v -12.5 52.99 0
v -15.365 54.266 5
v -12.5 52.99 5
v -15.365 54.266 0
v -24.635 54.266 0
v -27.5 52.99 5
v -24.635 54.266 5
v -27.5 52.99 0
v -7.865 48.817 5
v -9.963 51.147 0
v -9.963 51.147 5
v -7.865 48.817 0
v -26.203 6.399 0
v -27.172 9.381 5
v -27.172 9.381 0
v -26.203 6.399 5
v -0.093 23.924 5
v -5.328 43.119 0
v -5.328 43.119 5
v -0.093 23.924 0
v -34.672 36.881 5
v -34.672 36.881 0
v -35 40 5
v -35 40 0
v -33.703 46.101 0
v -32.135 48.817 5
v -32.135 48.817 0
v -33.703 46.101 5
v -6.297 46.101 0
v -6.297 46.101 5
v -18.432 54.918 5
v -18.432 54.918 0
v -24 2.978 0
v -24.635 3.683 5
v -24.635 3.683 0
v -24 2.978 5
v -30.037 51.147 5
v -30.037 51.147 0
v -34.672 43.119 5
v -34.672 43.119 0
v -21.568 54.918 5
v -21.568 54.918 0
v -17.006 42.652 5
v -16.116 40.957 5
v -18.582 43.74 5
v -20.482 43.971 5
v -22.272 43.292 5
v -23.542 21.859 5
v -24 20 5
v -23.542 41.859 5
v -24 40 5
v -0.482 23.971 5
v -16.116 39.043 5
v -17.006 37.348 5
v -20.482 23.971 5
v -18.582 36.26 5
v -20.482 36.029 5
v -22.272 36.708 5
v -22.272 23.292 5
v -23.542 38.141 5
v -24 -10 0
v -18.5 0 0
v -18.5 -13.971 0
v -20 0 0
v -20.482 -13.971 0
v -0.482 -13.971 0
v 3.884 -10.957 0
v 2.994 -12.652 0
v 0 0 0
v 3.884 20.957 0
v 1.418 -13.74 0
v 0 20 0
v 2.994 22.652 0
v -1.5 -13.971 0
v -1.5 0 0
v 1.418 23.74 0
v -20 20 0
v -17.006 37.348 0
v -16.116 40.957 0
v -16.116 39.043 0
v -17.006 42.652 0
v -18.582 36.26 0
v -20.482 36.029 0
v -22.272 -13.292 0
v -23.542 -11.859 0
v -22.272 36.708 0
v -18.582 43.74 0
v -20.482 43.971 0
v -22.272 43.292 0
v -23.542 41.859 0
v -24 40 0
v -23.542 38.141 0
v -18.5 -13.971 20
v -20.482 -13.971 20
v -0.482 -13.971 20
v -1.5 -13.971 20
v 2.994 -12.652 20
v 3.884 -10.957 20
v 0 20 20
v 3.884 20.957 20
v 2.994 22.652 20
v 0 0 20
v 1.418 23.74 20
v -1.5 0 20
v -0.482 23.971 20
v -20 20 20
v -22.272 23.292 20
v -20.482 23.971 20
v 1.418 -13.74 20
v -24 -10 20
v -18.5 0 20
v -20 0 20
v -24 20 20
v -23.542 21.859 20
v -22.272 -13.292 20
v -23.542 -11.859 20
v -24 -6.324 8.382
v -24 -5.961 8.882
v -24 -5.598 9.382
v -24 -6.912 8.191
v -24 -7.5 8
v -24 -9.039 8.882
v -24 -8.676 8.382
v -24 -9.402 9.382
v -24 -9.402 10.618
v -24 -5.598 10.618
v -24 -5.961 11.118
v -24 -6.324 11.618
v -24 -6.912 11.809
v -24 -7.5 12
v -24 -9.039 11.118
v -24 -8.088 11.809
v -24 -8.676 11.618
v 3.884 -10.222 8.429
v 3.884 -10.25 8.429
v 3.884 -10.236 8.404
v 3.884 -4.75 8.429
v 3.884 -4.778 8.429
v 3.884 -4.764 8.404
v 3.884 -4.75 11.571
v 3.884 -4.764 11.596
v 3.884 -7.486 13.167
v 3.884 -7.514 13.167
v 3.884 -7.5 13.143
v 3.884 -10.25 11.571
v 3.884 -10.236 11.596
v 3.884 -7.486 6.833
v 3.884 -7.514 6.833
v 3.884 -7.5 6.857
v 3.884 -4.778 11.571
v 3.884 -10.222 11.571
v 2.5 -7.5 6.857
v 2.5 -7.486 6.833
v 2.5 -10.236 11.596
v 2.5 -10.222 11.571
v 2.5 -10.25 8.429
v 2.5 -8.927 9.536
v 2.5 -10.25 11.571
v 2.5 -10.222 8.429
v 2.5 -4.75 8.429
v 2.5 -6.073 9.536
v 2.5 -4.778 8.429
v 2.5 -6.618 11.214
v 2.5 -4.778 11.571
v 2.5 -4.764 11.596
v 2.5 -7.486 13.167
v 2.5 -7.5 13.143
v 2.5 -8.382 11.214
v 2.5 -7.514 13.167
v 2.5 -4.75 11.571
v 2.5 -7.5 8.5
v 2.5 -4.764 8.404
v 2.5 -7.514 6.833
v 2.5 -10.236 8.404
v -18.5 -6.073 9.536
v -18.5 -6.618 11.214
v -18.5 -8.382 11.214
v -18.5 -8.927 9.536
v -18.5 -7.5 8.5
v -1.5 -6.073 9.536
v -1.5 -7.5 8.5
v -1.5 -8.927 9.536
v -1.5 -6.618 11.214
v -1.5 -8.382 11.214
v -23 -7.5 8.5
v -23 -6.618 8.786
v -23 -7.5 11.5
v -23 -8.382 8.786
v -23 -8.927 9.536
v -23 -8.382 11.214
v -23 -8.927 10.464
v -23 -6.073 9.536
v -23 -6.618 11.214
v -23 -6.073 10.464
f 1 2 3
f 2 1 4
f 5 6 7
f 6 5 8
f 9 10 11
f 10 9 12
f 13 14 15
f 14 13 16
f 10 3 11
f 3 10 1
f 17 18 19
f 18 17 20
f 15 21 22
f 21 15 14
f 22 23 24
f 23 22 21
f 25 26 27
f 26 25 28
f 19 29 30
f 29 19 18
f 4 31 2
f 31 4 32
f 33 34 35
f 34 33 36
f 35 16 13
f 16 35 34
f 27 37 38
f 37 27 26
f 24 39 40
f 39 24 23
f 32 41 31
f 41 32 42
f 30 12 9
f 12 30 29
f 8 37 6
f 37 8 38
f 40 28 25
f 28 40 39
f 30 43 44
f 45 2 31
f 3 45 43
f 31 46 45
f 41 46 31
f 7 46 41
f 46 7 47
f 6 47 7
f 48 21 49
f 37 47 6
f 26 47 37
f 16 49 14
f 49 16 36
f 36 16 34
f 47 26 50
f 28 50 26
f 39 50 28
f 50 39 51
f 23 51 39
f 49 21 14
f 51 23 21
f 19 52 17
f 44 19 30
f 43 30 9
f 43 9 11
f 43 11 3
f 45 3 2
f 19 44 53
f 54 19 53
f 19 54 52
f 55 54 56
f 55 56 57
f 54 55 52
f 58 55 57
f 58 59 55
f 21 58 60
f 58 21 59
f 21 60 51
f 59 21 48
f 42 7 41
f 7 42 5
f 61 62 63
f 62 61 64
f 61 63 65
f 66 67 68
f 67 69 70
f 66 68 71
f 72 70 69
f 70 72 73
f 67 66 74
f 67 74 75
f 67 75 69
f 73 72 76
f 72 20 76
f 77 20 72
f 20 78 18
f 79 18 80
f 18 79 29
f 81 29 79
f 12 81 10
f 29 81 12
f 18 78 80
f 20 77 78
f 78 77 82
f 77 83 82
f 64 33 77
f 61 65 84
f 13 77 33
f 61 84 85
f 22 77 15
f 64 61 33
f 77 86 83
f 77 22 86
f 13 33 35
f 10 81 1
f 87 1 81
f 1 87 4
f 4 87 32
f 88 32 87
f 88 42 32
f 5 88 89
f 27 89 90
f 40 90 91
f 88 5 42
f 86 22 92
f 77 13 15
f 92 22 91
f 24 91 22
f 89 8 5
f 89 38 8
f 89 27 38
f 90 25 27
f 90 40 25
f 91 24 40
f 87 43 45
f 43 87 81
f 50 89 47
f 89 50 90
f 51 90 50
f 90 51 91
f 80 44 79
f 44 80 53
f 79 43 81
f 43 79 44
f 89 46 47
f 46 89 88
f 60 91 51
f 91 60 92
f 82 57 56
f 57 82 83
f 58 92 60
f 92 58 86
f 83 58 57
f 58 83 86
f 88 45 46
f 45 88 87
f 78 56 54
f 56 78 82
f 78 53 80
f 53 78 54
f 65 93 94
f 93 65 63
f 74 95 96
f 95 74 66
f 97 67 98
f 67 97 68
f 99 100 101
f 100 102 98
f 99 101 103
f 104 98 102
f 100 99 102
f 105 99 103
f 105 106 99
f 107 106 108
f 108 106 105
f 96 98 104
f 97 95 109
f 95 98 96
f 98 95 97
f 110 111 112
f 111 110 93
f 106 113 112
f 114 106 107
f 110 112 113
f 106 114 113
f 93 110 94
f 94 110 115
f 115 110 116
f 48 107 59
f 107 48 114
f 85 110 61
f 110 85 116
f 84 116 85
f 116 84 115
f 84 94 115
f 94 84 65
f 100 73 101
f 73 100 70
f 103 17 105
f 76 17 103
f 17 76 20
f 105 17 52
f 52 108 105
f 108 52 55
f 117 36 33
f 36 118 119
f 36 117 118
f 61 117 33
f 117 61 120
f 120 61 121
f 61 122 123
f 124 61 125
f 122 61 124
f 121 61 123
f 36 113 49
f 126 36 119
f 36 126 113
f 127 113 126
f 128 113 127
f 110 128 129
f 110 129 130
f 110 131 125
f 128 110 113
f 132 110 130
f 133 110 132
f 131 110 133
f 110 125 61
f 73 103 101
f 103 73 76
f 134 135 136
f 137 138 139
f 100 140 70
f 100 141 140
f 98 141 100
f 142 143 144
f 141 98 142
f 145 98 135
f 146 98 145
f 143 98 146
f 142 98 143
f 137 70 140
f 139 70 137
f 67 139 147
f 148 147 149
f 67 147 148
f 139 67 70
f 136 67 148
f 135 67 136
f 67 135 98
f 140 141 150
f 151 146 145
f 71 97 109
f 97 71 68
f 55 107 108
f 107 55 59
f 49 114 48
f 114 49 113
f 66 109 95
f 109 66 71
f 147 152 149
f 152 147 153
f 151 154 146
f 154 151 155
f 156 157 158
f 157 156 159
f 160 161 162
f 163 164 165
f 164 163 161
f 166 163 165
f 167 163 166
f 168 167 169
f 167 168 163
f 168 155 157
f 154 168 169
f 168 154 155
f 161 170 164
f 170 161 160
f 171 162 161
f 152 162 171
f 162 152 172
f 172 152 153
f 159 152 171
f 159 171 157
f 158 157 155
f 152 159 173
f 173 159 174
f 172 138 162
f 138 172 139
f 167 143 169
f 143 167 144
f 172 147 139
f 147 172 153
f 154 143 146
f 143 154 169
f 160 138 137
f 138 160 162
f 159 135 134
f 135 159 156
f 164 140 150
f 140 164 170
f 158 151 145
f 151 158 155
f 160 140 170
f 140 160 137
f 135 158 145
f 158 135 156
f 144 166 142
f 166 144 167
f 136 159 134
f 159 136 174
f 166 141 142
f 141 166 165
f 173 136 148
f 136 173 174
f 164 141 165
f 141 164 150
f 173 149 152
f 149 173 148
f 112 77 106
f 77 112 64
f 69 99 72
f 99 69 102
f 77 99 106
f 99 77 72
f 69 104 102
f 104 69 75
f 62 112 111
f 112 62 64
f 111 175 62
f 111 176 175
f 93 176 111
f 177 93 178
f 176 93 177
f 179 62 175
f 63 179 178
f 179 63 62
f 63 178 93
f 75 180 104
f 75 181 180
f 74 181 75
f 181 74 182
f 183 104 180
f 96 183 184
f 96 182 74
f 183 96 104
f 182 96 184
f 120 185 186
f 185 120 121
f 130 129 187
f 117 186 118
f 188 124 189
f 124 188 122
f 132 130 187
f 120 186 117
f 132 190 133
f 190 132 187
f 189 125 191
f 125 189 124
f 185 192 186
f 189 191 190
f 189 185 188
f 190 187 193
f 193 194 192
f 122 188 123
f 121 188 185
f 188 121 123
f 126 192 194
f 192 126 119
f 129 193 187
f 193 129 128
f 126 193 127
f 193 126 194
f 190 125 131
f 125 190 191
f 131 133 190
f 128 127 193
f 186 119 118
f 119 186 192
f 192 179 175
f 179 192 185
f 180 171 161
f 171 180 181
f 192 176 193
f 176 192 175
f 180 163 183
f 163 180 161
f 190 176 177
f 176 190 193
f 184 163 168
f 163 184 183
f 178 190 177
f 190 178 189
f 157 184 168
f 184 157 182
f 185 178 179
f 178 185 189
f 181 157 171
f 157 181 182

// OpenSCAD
// size is the XY plane size, height in Z
module hexagon(size, height) {
  boxWidth = size/1.75;
  for (r = [-60, 0, 60]) rotate([0,0,r]) cube([boxWidth, size, height], true);
}

mirror([1,0,0]) {

difference() {

union() {

translate([0, -10, 0])
minkowski()
{
   cube([20,30,19]);
   cylinder(r=4,h=1);
}


difference() {
  hull()
  {
    translate([12.5, 12.5, 0])
    cylinder(r=15,h=5);
    translate([20, 40, 0])
    cylinder(r=15,h=5);
  }
  translate([20, 40, -1])
  cylinder(r=4,h=6);
}
}

   translate([0, 0, -1])
   cube([20,20,22]);

   translate([1.5, -16, -1])
   cube([17,20,22]);


// screw holes

translate([-4,-7.5,10])
rotate(a=90, v=[0,1,0])
hexagon(5.5, 3);

translate([23,-7.5,10])
rotate(a=90, v=[0,1,0])
cylinder(r2=3, r1=1.5, h=3);

translate([-10,-7.5,10])
rotate(a=90, v=[0,1,0])
cylinder(r=1.5, h=40);

}

}
